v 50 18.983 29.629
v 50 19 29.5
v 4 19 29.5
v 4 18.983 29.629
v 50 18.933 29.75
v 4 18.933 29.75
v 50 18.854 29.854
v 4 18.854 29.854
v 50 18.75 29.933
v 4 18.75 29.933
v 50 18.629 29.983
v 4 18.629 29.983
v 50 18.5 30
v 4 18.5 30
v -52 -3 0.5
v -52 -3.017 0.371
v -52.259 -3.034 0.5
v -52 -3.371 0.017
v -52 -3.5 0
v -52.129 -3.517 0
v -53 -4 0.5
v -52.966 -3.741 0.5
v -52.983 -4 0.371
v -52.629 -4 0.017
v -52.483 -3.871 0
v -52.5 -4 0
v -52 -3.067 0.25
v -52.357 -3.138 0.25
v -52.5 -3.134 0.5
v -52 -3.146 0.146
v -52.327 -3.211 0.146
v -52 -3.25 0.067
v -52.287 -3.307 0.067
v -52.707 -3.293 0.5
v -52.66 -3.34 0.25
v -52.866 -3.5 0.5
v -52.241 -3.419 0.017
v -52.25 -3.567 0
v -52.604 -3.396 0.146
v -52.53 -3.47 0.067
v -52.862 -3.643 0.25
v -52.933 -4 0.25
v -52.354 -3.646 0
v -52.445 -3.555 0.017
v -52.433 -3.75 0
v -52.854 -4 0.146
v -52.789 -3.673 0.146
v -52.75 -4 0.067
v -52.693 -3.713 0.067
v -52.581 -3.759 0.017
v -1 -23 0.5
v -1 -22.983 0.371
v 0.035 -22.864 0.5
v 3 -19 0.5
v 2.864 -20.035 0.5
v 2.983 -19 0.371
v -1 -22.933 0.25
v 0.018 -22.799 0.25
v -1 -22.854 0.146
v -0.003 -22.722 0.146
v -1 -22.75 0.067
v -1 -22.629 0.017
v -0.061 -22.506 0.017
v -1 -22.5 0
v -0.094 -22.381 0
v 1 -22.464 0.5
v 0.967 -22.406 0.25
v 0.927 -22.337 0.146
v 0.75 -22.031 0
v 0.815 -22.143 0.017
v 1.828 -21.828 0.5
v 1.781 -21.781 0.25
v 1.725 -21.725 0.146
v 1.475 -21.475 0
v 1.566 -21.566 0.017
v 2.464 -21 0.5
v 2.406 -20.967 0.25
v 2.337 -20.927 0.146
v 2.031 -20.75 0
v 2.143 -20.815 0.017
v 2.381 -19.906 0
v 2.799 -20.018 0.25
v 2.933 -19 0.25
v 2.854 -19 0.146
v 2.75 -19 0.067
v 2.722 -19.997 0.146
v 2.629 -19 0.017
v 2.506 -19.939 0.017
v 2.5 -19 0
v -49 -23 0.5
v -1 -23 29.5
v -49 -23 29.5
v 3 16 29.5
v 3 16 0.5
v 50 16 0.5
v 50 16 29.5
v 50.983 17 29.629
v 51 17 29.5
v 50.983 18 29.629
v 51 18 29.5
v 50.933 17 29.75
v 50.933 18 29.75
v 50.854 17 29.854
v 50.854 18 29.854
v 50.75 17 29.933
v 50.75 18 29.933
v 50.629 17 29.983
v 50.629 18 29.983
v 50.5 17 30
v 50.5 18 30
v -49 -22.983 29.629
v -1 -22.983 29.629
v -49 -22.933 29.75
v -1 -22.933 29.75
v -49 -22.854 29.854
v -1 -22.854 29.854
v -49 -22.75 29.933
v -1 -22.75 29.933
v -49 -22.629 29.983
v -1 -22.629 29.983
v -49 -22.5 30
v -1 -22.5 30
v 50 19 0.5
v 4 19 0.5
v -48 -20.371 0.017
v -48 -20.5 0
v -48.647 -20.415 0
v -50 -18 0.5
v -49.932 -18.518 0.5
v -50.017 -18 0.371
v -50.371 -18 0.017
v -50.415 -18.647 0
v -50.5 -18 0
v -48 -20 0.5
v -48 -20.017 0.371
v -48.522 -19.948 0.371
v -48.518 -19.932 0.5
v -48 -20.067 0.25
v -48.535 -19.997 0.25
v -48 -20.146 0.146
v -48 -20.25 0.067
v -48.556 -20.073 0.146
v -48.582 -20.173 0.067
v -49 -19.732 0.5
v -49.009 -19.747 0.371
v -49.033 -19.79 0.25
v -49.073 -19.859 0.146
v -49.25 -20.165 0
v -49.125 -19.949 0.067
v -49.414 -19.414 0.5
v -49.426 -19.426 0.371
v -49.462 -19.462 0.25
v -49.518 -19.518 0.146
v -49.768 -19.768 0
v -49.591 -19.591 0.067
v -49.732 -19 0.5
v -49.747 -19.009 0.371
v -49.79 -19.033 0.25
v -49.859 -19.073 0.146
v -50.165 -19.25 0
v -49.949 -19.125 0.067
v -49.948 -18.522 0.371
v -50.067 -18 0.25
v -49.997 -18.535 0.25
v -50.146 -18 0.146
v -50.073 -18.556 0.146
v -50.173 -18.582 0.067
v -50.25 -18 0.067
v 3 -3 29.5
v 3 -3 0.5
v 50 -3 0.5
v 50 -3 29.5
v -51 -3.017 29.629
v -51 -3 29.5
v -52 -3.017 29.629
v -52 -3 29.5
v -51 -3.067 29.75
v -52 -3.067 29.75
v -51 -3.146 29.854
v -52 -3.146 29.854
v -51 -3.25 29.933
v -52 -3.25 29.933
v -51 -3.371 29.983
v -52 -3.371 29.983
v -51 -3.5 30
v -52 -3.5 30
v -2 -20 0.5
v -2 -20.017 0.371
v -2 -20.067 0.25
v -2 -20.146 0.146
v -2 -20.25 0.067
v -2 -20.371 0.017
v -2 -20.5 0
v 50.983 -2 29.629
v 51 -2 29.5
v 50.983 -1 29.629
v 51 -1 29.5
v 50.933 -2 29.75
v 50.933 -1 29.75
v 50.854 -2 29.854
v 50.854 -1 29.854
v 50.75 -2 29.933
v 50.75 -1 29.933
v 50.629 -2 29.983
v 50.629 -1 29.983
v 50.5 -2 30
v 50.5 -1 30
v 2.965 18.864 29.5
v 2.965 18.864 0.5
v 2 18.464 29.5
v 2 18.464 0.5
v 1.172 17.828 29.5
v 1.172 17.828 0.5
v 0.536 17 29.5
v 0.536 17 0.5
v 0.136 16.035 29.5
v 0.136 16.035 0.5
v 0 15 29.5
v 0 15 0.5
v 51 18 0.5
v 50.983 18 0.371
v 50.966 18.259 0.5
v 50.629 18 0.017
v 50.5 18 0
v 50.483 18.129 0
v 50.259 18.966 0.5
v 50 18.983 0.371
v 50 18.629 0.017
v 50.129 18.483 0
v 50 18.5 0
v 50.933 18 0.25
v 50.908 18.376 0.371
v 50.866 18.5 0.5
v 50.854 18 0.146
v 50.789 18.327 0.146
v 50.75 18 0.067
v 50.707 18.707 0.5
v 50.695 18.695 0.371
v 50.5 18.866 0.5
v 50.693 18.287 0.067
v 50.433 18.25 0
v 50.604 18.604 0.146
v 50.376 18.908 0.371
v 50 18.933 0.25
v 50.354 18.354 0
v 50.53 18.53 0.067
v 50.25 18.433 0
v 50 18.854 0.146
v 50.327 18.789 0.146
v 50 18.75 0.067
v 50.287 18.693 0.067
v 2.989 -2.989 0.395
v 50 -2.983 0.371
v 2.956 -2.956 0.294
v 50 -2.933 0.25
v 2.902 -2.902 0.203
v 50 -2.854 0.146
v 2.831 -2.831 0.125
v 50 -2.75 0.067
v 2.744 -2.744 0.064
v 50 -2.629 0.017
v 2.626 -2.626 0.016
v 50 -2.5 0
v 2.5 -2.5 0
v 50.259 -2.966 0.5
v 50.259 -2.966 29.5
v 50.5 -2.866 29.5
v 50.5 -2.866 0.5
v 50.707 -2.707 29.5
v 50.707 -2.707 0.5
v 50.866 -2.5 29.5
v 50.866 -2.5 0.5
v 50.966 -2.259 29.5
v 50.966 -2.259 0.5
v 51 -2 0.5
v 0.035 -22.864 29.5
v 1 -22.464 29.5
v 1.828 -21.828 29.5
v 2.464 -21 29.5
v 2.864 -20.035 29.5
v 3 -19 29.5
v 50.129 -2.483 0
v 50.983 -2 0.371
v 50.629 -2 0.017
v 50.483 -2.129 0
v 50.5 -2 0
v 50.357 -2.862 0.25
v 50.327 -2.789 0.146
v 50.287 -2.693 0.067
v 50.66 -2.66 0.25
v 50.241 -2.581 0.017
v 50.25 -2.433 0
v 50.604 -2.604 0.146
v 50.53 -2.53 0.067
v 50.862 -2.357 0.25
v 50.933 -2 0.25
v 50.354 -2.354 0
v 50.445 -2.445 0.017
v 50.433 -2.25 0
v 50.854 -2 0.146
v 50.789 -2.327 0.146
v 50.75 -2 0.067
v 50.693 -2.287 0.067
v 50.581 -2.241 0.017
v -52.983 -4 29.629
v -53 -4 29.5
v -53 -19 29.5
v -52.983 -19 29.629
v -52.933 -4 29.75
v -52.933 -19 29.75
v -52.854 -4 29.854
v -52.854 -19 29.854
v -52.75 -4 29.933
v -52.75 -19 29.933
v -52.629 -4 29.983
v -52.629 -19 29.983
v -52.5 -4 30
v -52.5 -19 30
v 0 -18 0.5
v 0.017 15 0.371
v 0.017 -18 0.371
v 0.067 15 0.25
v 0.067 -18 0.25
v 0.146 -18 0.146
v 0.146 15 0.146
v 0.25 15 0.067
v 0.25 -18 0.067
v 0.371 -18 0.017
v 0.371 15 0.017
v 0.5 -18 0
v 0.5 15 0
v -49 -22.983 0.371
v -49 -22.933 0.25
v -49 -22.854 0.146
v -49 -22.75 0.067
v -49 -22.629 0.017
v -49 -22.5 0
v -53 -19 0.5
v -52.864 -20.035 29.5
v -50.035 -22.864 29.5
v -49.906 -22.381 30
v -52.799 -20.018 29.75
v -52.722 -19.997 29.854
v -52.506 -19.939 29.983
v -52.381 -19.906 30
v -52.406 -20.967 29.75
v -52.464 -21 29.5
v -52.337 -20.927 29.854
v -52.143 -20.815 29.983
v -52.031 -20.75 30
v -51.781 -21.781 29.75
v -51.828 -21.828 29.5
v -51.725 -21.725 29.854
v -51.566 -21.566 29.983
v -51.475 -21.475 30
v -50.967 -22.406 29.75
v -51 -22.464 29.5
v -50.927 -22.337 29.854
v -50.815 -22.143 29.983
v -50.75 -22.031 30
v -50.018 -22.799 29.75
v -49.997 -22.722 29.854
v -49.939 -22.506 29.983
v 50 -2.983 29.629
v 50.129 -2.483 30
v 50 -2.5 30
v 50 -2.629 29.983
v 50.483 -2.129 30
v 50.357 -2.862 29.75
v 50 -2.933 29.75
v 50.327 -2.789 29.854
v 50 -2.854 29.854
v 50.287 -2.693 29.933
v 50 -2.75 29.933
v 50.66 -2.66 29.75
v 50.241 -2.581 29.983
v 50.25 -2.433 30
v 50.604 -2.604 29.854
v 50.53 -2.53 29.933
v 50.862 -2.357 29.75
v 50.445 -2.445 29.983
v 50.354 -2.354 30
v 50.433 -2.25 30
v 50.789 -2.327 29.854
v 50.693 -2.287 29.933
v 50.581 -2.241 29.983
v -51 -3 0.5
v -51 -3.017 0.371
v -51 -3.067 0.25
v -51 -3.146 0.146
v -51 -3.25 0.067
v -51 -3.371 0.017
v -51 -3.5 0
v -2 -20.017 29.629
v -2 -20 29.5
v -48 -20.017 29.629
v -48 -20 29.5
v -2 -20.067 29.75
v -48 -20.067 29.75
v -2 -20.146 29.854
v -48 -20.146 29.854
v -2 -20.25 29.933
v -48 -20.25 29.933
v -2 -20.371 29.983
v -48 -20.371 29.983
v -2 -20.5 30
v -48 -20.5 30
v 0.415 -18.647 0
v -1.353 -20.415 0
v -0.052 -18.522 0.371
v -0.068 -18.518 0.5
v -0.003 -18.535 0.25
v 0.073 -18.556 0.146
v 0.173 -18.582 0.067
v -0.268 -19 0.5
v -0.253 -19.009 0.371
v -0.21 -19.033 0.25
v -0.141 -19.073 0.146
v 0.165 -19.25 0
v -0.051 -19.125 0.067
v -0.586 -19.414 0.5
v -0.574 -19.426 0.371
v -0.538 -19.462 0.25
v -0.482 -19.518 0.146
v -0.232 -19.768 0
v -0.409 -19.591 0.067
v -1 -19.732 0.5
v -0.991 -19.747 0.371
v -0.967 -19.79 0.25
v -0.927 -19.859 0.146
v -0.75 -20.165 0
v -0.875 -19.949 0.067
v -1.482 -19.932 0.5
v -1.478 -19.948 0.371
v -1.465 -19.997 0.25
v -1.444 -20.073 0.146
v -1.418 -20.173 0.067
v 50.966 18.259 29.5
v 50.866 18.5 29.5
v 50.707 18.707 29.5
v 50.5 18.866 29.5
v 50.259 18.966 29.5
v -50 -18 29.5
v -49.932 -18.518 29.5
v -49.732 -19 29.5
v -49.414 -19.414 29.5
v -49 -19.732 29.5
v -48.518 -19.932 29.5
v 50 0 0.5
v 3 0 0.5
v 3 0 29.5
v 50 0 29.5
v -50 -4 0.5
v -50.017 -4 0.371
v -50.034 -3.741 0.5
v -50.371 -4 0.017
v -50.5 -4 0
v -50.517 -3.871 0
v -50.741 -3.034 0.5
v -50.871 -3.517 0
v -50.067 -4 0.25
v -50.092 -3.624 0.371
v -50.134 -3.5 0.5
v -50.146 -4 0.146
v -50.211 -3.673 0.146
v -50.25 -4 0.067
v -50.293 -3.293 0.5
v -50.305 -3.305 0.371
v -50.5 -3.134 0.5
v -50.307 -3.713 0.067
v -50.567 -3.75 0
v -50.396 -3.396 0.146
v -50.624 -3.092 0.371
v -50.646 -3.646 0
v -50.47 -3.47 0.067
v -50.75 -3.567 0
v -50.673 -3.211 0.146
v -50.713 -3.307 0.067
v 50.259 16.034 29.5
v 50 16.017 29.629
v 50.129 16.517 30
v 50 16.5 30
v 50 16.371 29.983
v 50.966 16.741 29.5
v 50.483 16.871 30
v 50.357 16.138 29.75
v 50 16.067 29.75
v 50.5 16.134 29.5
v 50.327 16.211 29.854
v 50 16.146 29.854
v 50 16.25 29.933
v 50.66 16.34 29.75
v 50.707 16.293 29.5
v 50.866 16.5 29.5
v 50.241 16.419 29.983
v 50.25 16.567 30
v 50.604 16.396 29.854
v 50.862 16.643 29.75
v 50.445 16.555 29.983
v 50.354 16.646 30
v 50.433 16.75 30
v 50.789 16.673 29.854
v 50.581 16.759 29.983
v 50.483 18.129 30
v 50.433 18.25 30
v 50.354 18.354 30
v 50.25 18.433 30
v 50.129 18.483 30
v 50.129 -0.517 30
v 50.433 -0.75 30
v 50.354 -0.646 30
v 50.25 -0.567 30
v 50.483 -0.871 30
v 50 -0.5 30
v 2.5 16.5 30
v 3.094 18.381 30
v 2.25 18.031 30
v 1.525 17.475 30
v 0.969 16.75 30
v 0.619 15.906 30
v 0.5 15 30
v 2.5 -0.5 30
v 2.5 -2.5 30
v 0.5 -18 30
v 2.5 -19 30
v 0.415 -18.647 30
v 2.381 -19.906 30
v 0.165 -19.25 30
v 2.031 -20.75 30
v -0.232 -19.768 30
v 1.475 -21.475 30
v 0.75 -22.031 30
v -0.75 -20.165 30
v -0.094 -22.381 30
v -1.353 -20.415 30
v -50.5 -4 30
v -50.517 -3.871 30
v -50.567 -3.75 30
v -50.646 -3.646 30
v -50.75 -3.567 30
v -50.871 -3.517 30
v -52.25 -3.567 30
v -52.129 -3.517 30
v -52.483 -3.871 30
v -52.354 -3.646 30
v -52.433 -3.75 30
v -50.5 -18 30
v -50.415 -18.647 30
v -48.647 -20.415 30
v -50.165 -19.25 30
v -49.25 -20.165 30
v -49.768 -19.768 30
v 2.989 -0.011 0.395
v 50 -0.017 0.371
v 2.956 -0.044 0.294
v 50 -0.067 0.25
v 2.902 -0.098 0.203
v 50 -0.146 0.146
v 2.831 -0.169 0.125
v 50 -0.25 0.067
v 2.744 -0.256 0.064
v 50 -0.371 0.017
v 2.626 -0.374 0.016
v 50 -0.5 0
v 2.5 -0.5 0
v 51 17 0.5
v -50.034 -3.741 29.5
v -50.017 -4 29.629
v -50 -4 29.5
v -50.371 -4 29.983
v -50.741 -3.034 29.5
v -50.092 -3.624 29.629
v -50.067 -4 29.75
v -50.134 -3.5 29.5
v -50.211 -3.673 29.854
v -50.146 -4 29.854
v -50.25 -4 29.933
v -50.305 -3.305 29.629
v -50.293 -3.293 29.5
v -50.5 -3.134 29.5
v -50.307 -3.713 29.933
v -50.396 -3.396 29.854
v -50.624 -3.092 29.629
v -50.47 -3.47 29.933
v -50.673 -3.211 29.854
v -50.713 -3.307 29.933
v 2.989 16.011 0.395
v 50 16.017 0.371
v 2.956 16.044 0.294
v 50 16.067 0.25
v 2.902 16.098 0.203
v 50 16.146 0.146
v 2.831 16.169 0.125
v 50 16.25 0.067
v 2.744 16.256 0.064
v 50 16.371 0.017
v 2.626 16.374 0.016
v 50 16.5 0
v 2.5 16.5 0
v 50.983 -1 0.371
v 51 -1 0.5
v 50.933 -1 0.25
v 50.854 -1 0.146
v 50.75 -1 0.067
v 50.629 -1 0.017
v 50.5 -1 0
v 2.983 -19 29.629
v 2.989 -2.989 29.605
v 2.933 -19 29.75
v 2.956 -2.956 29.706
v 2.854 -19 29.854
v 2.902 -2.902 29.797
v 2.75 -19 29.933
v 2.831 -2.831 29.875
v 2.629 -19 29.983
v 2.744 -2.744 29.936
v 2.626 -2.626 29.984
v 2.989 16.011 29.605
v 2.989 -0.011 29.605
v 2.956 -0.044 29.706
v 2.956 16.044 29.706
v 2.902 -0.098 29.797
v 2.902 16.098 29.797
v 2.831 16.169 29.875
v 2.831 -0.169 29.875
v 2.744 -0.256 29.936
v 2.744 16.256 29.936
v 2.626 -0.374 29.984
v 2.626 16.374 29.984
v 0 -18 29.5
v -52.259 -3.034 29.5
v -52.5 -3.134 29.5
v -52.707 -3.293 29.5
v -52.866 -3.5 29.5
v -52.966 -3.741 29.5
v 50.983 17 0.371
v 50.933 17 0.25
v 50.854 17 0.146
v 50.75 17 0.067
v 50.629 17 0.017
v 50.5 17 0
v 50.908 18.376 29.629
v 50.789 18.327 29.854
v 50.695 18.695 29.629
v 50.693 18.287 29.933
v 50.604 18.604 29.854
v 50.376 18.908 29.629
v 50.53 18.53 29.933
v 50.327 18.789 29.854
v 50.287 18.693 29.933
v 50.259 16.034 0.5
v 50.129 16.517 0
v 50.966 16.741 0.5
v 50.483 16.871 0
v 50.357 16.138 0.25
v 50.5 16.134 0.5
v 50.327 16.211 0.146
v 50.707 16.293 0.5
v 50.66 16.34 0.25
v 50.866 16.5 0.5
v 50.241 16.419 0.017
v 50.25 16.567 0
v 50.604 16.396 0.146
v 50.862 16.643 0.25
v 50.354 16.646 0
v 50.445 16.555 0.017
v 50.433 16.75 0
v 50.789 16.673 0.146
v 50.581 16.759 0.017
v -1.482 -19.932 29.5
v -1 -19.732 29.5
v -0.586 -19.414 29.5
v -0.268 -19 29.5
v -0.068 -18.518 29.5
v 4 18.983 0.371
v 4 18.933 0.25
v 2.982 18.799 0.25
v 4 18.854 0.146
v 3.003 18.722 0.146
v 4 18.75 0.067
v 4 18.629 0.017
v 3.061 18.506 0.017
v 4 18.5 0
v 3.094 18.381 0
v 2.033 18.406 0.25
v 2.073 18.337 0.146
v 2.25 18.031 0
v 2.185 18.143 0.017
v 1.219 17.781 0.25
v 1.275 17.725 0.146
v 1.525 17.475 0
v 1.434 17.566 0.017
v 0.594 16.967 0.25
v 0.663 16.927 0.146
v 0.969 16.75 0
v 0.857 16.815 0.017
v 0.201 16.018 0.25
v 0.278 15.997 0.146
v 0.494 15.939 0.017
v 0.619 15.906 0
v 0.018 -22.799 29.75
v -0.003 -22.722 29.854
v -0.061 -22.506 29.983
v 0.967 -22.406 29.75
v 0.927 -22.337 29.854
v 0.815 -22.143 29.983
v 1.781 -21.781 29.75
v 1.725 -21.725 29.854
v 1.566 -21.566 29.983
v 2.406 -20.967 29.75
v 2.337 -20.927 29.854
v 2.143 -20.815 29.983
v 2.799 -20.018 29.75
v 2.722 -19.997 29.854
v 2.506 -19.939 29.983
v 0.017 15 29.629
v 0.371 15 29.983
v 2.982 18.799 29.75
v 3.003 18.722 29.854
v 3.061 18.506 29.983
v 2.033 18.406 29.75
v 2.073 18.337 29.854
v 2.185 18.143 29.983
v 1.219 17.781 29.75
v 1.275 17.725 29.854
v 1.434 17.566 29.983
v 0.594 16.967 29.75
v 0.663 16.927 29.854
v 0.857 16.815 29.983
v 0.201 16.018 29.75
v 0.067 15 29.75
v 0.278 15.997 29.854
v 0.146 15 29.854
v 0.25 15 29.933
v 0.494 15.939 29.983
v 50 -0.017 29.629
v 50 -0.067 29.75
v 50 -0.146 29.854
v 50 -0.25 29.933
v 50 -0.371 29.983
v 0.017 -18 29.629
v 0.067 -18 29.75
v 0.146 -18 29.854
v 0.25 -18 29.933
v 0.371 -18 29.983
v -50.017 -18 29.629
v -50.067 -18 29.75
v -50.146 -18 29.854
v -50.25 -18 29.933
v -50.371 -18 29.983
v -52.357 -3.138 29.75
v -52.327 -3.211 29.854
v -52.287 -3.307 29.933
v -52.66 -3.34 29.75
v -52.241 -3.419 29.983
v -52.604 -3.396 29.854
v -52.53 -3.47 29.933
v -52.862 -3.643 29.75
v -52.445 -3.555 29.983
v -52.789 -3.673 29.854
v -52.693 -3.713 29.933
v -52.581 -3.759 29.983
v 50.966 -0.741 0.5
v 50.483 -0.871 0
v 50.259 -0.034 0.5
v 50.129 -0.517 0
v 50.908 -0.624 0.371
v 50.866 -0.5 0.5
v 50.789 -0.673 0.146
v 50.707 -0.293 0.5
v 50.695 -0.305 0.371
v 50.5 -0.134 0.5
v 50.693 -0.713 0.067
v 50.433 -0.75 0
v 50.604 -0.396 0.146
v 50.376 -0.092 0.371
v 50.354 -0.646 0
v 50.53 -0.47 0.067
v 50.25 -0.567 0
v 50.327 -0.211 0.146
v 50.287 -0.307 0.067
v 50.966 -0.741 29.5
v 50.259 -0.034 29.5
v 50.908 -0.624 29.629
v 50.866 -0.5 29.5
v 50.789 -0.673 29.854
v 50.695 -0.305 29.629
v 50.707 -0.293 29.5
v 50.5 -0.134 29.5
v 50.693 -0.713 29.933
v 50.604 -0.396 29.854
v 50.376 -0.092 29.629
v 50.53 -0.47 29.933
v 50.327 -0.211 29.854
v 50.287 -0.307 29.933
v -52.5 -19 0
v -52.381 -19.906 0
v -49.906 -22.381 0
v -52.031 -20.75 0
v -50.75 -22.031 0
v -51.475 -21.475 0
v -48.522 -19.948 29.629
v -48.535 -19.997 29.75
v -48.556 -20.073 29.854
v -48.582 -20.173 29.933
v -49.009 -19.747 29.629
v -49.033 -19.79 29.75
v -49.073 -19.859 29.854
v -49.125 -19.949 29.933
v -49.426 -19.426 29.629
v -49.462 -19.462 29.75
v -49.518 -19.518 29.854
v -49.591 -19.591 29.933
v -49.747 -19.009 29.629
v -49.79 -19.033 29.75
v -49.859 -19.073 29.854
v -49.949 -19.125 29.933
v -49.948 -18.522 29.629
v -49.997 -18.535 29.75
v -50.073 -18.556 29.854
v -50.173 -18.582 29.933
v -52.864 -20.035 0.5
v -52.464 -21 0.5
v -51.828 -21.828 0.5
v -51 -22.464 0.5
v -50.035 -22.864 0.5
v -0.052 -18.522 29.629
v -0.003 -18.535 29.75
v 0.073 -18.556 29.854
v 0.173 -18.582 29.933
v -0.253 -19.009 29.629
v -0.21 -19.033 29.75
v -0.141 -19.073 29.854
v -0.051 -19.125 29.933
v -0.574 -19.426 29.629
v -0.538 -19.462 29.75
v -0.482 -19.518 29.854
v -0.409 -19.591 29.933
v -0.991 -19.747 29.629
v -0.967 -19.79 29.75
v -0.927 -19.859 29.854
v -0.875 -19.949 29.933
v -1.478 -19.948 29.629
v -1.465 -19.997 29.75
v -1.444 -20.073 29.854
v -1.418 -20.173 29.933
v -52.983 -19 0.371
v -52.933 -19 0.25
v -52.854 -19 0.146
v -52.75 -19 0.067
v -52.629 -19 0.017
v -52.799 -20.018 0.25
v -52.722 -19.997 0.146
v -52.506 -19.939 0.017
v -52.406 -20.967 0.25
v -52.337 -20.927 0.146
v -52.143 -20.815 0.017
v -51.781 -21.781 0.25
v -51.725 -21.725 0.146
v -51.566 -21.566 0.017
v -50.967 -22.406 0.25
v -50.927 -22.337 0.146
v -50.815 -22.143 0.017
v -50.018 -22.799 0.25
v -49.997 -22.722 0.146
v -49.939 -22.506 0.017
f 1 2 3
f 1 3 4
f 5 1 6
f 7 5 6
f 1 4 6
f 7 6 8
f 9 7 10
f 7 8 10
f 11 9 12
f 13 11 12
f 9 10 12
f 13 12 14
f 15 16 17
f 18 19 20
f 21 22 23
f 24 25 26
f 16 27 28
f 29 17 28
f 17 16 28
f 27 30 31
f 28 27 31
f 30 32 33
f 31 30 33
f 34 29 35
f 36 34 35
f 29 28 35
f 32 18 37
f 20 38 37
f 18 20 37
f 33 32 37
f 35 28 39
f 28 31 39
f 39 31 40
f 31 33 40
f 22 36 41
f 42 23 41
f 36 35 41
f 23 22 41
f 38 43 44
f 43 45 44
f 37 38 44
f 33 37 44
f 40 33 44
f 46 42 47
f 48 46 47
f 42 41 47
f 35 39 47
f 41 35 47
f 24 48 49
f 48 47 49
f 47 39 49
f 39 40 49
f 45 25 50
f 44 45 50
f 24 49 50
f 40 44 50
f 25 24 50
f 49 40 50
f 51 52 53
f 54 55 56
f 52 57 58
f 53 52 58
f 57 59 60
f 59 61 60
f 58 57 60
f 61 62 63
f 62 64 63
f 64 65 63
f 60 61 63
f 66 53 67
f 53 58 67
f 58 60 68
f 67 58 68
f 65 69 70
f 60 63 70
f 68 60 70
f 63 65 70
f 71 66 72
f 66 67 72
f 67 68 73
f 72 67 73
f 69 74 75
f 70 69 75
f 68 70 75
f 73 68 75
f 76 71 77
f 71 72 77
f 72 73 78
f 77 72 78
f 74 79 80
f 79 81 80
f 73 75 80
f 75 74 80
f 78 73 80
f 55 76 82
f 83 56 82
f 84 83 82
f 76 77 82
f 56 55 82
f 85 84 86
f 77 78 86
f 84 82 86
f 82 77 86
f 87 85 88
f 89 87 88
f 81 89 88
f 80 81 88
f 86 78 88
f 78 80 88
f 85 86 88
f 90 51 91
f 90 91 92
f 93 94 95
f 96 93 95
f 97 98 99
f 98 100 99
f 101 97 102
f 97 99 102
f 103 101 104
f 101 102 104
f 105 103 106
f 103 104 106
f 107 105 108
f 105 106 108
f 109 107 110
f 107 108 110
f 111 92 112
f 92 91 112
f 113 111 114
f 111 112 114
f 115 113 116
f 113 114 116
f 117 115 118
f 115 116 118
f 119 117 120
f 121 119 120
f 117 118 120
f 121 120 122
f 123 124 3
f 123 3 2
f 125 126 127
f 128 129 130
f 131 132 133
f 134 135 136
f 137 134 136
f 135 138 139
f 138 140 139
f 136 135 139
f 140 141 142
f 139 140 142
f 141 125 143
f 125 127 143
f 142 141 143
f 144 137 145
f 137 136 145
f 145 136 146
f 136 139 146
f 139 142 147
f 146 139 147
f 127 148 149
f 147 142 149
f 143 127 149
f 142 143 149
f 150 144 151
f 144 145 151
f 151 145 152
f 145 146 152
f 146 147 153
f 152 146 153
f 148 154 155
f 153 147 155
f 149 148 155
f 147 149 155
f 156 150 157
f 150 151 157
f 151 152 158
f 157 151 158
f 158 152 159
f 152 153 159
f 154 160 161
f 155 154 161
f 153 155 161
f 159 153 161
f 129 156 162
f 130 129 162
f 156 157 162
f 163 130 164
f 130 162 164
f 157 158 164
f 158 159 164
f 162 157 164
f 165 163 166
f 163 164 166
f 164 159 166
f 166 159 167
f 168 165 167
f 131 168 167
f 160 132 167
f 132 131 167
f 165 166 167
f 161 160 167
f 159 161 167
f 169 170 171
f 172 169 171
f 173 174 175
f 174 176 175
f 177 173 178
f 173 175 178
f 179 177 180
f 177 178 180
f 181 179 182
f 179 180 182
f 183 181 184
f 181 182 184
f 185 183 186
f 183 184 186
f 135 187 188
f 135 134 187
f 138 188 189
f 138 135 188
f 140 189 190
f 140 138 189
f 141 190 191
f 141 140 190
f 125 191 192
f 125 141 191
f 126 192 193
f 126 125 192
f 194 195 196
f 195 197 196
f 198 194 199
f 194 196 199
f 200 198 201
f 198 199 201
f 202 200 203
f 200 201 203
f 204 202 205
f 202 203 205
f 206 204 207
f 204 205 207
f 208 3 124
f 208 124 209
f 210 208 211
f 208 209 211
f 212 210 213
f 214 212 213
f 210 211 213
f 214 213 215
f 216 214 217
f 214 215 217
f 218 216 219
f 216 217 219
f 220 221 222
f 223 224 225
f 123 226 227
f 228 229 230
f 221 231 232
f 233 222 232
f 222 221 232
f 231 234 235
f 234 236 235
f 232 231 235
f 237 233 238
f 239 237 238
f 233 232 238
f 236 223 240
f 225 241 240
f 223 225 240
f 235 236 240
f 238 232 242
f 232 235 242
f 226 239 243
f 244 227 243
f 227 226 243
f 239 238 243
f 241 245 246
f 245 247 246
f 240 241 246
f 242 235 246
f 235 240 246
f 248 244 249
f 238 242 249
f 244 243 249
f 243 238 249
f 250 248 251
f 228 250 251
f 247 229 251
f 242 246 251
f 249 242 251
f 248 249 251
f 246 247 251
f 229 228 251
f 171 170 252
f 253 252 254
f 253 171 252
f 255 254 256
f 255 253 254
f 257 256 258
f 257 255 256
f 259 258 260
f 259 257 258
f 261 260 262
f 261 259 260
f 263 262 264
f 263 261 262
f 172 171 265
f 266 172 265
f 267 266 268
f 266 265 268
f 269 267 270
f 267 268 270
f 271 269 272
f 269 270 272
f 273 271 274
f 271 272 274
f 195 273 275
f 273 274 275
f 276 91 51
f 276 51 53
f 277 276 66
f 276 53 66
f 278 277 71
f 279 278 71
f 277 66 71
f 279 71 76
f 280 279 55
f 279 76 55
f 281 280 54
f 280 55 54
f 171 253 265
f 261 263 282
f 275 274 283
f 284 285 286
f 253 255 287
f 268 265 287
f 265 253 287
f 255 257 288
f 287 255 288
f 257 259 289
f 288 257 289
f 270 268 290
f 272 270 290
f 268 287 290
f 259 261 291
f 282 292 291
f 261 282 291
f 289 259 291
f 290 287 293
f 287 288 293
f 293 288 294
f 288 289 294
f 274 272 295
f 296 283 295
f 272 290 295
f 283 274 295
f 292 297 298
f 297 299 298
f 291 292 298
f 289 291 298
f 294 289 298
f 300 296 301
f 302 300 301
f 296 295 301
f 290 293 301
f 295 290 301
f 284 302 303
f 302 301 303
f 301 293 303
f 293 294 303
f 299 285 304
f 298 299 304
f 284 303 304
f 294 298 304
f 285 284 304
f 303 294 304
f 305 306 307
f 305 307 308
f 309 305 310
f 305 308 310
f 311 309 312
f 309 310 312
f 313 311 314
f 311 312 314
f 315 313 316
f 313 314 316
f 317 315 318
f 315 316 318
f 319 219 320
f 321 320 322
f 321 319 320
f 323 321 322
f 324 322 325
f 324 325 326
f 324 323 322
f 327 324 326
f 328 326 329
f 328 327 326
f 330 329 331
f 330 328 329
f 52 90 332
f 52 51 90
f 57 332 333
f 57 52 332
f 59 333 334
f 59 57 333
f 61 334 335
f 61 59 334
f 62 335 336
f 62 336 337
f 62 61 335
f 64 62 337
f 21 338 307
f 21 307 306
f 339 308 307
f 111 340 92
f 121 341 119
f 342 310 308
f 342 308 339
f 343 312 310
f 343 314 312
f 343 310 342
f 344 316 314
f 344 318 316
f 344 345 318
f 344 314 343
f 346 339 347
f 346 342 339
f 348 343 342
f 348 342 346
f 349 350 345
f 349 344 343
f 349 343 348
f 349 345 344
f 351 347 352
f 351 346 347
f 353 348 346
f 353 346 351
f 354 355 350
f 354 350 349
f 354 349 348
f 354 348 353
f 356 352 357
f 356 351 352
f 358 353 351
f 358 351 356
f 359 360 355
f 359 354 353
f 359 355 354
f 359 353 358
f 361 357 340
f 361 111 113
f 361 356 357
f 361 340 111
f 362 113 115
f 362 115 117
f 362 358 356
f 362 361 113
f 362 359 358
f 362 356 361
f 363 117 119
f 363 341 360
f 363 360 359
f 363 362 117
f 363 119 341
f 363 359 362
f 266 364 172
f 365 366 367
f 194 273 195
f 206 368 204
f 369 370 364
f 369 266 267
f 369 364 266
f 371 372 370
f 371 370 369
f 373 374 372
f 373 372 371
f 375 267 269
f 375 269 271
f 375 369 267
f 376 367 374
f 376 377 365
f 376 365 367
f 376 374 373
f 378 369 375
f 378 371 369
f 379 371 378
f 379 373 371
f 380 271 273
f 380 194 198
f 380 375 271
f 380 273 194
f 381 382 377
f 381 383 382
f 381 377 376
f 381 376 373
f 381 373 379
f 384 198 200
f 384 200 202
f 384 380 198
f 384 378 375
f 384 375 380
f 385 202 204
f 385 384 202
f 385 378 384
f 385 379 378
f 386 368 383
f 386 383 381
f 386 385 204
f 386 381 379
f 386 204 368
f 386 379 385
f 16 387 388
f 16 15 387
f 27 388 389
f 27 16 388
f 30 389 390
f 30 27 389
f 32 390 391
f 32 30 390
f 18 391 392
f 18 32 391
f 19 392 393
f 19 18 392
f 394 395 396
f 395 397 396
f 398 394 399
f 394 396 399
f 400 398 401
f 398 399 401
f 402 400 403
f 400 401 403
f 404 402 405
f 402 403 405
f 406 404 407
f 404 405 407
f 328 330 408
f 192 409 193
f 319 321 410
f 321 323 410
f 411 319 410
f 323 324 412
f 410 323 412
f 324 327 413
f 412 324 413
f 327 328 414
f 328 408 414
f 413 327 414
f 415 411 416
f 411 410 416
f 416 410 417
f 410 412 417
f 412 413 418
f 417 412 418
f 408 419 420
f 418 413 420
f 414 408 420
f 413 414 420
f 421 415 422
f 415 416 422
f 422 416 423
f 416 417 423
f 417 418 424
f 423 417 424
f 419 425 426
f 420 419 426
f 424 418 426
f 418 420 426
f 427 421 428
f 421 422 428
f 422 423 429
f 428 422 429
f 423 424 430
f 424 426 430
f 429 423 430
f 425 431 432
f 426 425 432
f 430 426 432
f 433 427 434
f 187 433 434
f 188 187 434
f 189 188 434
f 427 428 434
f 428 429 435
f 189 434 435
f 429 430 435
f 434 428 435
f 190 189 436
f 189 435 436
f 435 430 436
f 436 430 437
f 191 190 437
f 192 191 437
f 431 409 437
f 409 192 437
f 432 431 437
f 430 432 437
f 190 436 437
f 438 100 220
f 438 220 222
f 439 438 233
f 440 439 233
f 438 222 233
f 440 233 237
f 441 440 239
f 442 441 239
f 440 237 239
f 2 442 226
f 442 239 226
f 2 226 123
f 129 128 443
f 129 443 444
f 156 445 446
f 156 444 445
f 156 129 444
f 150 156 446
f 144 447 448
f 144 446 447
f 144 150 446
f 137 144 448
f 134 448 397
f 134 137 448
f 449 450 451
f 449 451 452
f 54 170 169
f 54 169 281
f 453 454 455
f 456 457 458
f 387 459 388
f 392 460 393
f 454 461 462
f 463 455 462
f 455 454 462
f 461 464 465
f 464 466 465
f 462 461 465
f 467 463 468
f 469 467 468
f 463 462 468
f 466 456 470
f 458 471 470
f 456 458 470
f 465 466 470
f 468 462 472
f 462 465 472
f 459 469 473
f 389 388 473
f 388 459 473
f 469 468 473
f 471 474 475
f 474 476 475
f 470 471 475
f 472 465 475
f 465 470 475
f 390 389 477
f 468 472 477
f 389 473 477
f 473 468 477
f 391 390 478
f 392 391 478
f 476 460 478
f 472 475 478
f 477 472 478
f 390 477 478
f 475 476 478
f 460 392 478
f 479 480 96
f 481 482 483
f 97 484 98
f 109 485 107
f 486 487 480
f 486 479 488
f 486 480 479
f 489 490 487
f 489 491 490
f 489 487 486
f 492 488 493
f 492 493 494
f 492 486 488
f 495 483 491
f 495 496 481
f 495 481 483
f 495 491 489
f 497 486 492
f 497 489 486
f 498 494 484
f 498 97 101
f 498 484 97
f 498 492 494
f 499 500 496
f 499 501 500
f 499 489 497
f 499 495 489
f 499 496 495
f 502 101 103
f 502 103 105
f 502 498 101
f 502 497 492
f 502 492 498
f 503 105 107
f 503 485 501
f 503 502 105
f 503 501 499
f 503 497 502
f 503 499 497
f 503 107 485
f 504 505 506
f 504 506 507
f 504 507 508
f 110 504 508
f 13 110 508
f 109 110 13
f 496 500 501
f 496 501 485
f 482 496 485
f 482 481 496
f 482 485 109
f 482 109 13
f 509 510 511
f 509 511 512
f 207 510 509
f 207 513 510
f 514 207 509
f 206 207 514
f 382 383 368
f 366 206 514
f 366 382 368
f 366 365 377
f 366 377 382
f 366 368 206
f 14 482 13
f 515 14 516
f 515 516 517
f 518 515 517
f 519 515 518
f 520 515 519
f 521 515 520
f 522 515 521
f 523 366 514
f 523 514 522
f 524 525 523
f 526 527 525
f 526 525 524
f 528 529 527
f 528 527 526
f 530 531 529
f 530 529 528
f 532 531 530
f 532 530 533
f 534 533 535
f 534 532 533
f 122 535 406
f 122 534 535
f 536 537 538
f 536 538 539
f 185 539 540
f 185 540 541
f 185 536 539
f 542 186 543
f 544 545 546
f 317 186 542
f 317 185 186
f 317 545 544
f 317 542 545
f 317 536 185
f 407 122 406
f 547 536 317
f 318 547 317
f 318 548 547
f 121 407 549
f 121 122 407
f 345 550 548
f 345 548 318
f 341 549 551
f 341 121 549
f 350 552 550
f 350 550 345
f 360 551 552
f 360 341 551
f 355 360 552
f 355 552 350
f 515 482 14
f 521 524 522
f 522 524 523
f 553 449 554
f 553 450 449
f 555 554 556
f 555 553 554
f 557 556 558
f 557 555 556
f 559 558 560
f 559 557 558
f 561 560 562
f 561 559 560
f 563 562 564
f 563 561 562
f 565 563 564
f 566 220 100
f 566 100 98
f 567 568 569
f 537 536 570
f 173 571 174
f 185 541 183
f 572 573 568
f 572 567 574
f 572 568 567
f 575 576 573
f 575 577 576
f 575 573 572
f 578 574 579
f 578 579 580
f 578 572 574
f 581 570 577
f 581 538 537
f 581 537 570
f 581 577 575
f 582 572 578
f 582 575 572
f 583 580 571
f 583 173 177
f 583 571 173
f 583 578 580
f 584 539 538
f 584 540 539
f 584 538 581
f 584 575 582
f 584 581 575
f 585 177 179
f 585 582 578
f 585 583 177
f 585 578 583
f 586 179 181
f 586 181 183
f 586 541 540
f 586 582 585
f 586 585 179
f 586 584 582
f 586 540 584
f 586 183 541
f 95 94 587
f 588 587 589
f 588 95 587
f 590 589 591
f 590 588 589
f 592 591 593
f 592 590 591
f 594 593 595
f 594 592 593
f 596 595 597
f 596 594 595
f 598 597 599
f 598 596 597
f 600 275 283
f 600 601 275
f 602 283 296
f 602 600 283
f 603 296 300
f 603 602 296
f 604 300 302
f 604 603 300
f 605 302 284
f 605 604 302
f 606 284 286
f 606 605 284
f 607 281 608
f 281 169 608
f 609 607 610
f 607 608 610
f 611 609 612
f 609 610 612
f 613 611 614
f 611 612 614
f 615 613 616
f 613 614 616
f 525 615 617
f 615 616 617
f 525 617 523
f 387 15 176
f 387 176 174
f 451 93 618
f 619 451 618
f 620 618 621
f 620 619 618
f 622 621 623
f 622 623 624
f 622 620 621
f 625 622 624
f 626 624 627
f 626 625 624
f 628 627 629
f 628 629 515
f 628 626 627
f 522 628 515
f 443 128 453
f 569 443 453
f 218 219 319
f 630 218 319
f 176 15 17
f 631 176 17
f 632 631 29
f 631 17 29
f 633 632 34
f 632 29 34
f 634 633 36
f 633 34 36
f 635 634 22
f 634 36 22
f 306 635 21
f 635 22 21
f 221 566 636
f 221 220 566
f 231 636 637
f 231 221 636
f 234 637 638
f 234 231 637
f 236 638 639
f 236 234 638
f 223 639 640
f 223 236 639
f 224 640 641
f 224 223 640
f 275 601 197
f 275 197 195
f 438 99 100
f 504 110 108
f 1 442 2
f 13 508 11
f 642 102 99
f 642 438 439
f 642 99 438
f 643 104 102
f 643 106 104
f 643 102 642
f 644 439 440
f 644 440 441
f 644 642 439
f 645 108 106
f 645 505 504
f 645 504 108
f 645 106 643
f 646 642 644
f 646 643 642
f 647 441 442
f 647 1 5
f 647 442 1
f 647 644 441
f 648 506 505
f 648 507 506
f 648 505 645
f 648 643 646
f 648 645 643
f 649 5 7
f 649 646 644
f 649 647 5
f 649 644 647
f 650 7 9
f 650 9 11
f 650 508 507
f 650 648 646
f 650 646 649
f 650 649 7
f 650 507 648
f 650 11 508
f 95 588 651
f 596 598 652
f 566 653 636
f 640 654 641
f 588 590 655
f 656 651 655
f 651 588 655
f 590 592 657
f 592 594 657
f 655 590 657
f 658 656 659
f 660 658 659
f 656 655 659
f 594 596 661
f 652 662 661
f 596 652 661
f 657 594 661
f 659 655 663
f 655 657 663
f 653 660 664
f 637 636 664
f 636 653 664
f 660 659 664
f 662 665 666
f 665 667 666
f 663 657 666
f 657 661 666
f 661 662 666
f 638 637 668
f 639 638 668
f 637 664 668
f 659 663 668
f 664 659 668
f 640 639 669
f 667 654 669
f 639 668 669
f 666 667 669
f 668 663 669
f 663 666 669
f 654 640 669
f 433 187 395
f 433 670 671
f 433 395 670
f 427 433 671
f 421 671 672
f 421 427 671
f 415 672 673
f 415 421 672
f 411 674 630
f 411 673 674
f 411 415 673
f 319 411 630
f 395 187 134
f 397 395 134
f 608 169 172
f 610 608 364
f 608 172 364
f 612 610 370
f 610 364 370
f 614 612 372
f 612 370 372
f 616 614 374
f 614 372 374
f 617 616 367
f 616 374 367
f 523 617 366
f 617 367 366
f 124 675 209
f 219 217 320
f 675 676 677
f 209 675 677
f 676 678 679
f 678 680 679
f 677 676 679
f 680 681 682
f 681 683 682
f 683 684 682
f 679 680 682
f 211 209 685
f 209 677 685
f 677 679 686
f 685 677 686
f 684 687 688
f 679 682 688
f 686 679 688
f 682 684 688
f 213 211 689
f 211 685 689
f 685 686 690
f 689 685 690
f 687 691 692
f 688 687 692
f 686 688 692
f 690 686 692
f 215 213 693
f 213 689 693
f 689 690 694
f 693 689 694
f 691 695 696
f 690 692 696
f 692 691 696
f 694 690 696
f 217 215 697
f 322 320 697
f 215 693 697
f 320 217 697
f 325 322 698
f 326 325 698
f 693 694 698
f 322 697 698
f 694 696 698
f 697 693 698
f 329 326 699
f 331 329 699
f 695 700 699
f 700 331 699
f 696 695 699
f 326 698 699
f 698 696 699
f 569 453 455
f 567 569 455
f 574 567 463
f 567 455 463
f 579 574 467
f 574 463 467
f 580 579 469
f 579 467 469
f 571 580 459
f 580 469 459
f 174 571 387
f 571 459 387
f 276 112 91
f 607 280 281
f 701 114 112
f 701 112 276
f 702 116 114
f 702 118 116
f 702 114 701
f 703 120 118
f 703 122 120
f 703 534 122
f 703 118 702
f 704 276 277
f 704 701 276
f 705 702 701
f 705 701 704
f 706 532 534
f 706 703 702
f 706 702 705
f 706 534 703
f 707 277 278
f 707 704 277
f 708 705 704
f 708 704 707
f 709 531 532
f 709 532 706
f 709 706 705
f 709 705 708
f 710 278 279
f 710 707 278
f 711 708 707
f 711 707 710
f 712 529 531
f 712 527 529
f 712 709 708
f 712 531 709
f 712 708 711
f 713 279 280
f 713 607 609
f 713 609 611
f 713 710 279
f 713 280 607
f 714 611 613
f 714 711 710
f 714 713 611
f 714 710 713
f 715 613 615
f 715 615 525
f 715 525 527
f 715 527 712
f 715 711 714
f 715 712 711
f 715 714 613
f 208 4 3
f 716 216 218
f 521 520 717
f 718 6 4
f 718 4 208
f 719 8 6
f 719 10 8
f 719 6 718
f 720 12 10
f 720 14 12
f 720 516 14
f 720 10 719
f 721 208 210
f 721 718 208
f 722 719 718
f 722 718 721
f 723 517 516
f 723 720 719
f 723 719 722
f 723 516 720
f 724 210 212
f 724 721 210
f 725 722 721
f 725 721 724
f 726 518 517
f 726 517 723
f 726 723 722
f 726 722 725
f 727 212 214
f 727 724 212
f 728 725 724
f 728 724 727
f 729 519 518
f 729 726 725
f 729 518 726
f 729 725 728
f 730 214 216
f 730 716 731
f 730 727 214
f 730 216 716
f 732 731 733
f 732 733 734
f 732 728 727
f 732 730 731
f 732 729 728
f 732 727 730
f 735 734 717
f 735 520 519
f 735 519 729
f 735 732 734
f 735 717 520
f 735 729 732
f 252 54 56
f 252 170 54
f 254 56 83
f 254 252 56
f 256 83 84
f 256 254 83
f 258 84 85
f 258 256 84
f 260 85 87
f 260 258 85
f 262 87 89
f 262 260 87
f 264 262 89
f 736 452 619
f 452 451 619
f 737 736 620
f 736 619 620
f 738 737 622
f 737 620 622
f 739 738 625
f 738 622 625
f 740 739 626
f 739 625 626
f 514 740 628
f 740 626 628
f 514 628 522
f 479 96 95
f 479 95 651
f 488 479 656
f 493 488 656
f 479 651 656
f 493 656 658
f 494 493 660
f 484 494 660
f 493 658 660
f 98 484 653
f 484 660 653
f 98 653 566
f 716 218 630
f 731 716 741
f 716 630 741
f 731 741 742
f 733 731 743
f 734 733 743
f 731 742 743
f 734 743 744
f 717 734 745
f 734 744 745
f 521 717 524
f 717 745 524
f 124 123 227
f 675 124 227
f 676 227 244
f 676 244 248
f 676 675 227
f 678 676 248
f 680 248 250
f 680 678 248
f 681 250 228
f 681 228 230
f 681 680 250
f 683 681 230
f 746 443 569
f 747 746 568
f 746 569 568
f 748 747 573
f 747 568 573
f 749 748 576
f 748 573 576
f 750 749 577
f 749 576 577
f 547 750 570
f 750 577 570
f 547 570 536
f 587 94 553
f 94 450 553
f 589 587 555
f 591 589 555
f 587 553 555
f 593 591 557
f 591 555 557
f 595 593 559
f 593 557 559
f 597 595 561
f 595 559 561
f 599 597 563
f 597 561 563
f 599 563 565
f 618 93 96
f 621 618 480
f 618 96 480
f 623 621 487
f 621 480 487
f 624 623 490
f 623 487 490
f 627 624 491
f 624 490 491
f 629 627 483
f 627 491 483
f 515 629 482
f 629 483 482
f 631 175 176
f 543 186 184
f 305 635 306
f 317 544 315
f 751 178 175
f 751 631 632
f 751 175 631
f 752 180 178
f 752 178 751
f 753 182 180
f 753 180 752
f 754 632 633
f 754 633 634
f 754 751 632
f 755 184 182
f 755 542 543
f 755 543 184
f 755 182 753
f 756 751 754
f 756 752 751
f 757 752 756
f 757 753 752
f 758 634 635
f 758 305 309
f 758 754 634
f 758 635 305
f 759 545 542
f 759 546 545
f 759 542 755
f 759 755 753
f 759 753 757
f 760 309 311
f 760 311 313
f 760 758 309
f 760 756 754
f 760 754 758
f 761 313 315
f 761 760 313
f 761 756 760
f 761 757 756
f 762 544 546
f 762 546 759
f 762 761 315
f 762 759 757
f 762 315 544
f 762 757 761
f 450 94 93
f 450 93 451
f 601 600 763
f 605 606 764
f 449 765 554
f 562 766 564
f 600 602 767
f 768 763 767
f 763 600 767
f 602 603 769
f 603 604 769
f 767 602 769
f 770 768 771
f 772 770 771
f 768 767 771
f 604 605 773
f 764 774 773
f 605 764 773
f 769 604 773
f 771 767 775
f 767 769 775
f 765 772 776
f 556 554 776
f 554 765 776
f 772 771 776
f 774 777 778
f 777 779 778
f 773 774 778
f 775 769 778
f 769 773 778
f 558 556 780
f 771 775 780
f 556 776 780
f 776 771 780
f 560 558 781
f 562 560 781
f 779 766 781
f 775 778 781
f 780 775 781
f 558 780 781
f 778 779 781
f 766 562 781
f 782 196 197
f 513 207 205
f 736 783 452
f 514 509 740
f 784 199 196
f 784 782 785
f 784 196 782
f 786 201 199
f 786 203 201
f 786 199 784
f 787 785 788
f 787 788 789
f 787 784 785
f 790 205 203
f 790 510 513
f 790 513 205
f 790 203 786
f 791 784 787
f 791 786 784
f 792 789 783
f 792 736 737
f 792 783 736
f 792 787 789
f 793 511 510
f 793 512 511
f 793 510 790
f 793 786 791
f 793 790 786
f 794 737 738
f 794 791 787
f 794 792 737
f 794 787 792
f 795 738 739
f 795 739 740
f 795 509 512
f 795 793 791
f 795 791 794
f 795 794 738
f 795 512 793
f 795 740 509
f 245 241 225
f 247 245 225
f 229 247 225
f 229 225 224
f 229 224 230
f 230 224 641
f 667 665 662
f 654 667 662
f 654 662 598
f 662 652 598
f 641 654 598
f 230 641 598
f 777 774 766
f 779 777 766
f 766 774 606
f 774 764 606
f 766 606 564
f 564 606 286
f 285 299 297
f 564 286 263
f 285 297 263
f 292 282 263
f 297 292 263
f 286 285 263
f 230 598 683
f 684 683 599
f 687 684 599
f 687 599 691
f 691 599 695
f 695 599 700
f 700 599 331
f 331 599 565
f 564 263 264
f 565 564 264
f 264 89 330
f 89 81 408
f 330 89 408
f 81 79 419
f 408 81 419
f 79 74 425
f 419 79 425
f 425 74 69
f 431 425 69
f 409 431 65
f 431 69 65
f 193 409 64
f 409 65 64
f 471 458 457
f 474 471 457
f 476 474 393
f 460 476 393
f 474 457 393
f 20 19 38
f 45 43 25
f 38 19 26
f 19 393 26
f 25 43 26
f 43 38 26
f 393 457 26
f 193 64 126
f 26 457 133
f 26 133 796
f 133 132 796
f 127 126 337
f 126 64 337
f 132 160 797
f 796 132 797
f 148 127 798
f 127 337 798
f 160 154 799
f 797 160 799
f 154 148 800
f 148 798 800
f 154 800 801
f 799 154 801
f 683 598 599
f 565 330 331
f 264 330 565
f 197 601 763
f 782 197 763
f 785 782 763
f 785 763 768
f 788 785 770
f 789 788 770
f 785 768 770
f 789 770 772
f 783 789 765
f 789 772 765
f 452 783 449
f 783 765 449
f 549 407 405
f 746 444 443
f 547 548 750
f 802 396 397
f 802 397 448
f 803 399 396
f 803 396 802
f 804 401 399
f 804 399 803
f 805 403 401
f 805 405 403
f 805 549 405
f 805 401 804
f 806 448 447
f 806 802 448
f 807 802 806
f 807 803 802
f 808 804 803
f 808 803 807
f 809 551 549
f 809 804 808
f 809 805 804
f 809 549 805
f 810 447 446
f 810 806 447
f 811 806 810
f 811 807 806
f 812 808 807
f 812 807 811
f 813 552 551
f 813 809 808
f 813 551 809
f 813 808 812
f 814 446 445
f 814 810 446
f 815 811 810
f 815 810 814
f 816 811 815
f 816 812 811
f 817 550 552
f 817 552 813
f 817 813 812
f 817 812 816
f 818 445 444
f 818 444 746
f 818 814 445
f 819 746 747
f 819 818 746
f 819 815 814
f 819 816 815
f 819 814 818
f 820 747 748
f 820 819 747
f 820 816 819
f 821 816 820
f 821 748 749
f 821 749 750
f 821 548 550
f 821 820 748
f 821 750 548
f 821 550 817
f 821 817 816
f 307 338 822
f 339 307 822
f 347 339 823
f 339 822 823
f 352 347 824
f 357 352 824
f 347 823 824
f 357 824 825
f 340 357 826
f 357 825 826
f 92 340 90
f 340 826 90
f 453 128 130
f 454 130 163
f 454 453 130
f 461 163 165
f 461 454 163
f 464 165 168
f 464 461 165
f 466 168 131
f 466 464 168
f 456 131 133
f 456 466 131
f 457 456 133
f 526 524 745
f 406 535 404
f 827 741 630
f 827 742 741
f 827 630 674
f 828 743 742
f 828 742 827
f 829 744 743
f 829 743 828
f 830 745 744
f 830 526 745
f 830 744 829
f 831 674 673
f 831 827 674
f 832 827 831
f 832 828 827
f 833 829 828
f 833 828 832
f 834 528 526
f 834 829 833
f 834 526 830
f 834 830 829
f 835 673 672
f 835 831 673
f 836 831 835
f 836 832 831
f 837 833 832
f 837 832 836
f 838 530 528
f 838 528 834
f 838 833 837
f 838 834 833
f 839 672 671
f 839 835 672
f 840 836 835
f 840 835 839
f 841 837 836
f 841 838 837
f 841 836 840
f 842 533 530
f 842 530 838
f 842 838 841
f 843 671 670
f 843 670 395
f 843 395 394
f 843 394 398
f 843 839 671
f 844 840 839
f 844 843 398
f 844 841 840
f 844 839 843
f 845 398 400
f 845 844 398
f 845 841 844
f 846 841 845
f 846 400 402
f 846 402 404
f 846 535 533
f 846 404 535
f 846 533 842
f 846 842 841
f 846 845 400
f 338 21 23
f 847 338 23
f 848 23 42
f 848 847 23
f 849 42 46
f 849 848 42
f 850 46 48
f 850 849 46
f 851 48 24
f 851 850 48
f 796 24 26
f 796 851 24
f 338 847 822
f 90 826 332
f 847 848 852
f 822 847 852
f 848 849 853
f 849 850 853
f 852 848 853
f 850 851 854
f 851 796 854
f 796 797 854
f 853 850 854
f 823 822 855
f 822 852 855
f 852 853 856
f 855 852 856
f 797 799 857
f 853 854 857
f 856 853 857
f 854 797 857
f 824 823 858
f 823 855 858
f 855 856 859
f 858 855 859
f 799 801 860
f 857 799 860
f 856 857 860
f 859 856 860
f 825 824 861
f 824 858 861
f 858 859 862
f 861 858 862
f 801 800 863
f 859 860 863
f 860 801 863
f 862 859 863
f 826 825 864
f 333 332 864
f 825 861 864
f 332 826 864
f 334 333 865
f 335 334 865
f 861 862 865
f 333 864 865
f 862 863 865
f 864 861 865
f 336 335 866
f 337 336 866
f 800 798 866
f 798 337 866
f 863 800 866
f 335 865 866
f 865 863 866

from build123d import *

# Parameters (mm, degrees)
PAD_DEPTH = 30
FILLET_R  = 0.5


with BuildPart() as part:
    # Sketch → Pad (new body)
    with BuildSketch(Plane(origin=(0, 0, 0), x_dir=(-1, 0, 0), z_dir=(0, 0, 1))):
        with BuildLine():
            ThreePointArc((1, 23), (-1.828427, 21.828427), (-3, 19))
            Line((-3, 3), (-3, 19))
            Line((-3, 3), (-49.999999, 3))
            ThreePointArc((-49.999999, 3), (-50.707106, 2.707107), (-50.999999, 2))
            Line((-50.999999, 1), (-50.999999, 2))
            ThreePointArc((-50.999999, 1), (-50.707106, 0.292893), (-49.999999, 0))
            Line((-3, 0), (-49.999999, 0))
            Line((-3, -16), (-3, 0))
            Line((-3, -16), (-49.999999, -16))
            ThreePointArc((-49.999999, -16), (-50.707106, -16.292893), (-50.999999, -17))
            Line((-50.999999, -18), (-50.999999, -17))
            ThreePointArc((-50.999999, -18), (-50.707106, -18.707107), (-49.999999, -19))
            Line((-4, -19), (-49.999999, -19))
            ThreePointArc((-4, -19), (-1.171573, -17.828427), (0, -15))
            Line((0, -15), (0, 18))
            ThreePointArc((2, 20), (0.585786, 19.414214), (0, 18))
            Line((2, 20), (48, 20))
            ThreePointArc((50, 18), (49.414214, 19.414214), (48, 20))
            Line((50, 18), (50, 4))
            ThreePointArc((50, 4), (50.292893, 3.292893), (51, 3))
            Line((52, 3), (51, 3))
            ThreePointArc((52, 3), (52.707107, 3.292893), (53, 4))
            Line((53, 19), (53, 4))
            ThreePointArc((53, 19), (51.828427, 21.828427), (49, 23))
            Line((1, 23), (49, 23))
        make_face()
    extrude(amount=PAD_DEPTH)

    # Fillet
    fillet_edges = [part.edges().sort_by_distance(p)[0] for p in [
        (-51.828427, -21.828427, 0),
        (-25, -23, 0),
        (1.828427, -21.828427, 0),
        (3, -11, 0),
        (26.5, -3, 0),
        (50.707106, -2.707107, 0),
        (50.999999, -1.5, 0),
        (50.707106, -0.292893, 0),
        (26.5, 0, 0),
        (3, 8, 0),
        (26.5, 16, 0),
        (50.707106, 16.292893, 0),
        (50.999999, 17.5, 0),
        (50.707106, 18.707107, 0),
        (27, 19, 0),
        (1.171573, 17.828427, 0),
        (0, -1.5, 0),
        (-0.585786, -19.414214, 0),
        (-25, -20, 0),
        (-49.414214, -19.414214, 0),
        (-50, -11, 0),
        (-50.292893, -3.292893, 0),
        (-51.5, -3, 0),
        (-52.707107, -3.292893, 0),
        (-53, -11.5, 0),
        (-51.828427, -21.828427, 30),
        (-25, -23, 30),
        (1.828427, -21.828427, 30),
        (3, -11, 30),
        (26.5, -3, 30),
        (50.707106, -2.707107, 30),
        (50.999999, -1.5, 30),
        (50.707106, -0.292893, 30),
        (26.5, 0, 30),
        (3, 8, 30),
        (26.5, 16, 30),
        (50.707106, 16.292893, 30),
        (50.999999, 17.5, 30),
        (50.707106, 18.707107, 30),
        (27, 19, 30),
        (1.171573, 17.828427, 30),
        (0, -1.5, 30),
        (-0.585786, -19.414214, 30),
        (-25, -20, 30),
        (-49.414214, -19.414214, 30),
        (-50, -11, 30),
        (-50.292893, -3.292893, 30),
        (-51.5, -3, 30),
        (-52.707107, -3.292893, 30),
        (-53, -11.5, 30),
    ]]
    fillet(fillet_edges, radius=FILLET_R)


solid = part.part
